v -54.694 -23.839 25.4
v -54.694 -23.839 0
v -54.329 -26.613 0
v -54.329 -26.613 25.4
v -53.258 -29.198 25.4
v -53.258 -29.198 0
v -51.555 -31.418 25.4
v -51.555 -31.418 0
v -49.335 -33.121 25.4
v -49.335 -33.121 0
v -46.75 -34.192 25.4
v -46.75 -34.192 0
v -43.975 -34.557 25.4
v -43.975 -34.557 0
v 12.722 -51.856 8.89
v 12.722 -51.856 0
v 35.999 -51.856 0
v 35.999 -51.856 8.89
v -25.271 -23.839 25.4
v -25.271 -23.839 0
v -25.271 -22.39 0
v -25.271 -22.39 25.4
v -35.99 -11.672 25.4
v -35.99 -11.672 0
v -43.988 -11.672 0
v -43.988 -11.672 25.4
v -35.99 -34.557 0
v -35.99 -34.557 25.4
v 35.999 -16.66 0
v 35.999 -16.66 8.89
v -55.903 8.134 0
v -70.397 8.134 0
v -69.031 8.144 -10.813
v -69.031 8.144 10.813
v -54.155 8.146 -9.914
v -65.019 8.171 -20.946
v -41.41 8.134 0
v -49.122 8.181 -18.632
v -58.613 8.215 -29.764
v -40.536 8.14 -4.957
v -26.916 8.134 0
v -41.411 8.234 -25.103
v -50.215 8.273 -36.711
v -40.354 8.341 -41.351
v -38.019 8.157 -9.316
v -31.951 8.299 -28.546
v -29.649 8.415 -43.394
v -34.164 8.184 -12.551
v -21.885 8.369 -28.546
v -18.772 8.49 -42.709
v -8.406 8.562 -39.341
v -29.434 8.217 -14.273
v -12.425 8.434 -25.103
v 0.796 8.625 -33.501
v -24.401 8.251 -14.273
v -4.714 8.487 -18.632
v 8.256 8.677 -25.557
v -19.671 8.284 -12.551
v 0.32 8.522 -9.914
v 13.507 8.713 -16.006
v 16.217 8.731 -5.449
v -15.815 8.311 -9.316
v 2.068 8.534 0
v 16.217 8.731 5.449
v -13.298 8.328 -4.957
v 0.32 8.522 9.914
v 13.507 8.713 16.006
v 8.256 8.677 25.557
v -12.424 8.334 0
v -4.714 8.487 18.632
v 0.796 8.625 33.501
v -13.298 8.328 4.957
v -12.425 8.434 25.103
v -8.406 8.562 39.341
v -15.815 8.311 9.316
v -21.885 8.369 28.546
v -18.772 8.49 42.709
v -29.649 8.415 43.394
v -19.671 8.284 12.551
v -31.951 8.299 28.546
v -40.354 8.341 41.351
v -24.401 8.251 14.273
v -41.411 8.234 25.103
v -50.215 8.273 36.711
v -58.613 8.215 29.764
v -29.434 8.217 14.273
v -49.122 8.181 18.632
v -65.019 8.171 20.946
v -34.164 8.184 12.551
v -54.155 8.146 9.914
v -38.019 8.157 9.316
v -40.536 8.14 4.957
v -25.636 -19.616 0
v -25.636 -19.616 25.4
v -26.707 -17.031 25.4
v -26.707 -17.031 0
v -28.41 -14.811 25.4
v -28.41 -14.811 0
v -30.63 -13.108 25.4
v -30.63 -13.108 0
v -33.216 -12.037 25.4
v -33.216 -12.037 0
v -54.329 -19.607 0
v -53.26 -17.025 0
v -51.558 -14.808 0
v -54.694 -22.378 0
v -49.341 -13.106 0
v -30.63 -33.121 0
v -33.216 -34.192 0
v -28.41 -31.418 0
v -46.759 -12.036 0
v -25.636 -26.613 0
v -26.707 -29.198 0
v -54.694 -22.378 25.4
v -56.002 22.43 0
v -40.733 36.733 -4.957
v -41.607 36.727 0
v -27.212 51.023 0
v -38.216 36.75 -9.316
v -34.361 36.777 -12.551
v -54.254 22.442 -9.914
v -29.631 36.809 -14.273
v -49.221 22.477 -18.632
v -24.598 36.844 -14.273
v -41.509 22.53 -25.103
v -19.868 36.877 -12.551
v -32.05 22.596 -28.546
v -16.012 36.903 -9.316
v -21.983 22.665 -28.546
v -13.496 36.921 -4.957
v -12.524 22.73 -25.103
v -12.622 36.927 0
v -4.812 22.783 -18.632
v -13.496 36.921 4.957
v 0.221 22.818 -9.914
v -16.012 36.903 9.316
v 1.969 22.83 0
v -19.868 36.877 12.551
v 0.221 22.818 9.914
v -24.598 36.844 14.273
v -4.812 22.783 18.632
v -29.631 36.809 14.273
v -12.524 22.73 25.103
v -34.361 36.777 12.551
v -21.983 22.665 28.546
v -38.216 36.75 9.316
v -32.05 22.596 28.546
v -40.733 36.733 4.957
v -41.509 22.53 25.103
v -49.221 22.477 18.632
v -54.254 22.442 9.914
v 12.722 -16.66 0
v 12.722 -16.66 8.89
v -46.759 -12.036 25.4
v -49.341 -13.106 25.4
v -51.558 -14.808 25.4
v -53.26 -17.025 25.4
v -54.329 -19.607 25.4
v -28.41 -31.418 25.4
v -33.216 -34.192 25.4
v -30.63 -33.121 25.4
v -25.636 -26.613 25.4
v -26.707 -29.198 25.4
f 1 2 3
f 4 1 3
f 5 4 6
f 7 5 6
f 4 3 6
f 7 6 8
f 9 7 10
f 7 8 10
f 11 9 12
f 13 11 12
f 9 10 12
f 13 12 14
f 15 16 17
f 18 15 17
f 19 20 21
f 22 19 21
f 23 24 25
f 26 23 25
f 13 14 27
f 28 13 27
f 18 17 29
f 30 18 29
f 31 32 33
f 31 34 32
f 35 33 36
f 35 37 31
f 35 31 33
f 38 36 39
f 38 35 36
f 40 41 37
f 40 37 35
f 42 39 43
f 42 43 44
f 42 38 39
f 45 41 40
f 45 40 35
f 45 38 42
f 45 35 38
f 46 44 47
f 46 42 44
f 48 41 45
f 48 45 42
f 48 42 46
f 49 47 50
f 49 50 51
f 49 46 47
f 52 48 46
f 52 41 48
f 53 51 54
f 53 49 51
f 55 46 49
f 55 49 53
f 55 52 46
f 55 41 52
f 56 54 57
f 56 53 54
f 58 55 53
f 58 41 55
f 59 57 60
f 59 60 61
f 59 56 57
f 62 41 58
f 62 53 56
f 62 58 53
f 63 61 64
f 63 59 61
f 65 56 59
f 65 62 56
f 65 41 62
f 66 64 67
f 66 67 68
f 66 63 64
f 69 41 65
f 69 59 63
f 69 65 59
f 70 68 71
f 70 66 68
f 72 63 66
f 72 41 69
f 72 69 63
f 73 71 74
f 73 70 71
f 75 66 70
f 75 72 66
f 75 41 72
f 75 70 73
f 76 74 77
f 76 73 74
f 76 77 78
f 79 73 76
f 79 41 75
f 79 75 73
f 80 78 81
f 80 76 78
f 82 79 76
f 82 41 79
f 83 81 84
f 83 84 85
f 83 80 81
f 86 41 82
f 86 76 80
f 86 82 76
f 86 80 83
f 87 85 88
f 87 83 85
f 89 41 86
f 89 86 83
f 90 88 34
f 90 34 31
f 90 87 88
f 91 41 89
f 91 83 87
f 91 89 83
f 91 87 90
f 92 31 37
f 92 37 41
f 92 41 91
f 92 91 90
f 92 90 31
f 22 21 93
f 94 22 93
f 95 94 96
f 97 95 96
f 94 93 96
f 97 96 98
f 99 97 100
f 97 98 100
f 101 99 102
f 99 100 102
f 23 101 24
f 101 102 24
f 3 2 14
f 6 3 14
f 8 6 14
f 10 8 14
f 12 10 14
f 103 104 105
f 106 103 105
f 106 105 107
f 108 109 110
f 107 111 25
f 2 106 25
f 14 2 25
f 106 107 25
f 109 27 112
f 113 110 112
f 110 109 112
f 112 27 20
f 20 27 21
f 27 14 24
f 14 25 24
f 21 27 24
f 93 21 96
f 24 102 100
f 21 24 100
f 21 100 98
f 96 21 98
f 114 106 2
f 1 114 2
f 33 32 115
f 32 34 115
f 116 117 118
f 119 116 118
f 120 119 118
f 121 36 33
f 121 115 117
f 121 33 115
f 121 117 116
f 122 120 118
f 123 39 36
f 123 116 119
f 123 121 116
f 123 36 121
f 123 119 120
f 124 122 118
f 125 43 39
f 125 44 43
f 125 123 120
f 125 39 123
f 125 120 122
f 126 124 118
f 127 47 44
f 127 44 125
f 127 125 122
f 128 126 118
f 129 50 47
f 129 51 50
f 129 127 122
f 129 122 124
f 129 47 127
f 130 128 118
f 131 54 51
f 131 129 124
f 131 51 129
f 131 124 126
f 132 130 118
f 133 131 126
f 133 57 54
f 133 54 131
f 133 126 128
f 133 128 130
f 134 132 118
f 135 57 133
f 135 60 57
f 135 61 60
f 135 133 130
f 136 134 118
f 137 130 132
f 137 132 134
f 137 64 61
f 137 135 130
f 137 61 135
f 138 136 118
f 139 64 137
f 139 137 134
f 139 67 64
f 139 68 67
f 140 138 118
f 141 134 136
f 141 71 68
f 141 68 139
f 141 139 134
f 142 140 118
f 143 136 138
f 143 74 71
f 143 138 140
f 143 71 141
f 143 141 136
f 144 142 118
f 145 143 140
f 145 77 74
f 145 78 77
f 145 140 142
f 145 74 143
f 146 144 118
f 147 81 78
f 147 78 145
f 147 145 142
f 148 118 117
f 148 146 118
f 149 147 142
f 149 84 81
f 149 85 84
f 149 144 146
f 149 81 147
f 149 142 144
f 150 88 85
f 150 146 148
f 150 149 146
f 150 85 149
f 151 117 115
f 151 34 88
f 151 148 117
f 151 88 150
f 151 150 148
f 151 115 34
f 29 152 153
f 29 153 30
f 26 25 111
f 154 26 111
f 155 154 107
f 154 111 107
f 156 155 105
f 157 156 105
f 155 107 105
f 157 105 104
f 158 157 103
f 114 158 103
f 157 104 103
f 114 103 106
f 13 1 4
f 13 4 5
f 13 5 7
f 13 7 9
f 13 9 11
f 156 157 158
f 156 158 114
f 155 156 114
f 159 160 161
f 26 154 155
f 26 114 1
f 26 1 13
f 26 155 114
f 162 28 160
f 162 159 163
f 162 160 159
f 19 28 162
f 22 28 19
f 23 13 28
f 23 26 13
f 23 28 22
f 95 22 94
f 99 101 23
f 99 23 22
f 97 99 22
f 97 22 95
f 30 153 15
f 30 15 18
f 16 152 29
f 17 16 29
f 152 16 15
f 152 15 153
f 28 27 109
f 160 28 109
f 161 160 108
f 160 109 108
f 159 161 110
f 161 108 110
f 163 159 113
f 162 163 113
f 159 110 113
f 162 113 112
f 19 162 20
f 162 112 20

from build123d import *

# Parameters (mm, degrees)
F3_DEPTH = 25.4
F4_W     = 23.2773851603
F4_H     = 35.1957660168
F5_DEPTH = 8.89


with BuildPart() as f1:
    # F0 (on Top) → F1 (revolve)
    with BuildSketch(Plane.XY):
        Polygon((-26.9164890051, 8.1341043115), (-27.2122733295, 51.0230138898), (-70.3969672322, 8.1341043115), align=None)
    revolve(axis=Axis((-27.0643811673, 29.5785591006, 0), (0.0068963584, -0.9999762198, 0)))


with BuildPart() as f3:
    # F2 (on Top) → F3 (new body)
    with BuildSketch(Plane.XY):
        with BuildLine():
            Line((-35.9897436637, -11.671599932), (-43.9875580206, -11.671599932))
            ThreePointArc((-43.9875580206, -11.671599932), (-51.558301073, -14.8075043816), (-54.6942055225, -22.378247434))
            Line((-54.6942055225, -22.378247434), (-54.6942055225, -23.8385121609))
            ThreePointArc((-54.6942055225, -23.8385121609), (-51.5547416887, -31.4178483271), (-43.9754055225, -34.5573121609))
            Line((-43.9754055225, -34.5573121609), (-35.9897436637, -34.5573121609))
            ThreePointArc((-35.9897436637, -34.5573121609), (-28.4104074975, -31.4178483271), (-25.2709436637, -23.8385121609))
            Line((-25.2709436637, -23.8385121609), (-25.2709436637, -22.390399932))
            ThreePointArc((-25.2709436637, -22.390399932), (-28.4104074975, -14.8110637658), (-35.9897436637, -11.671599932))
        make_face()
    extrude(amount=F3_DEPTH)


with BuildPart() as f5:
    # F4 (on Top) → F5 (new body)
    with BuildSketch(Plane.XY):
        with Locations((24.3601957336, -34.2578412965)):
            Rectangle(F4_W, F4_H)
    extrude(amount=F5_DEPTH)


solid = Compound([f1.part, f3.part, f5.part])
